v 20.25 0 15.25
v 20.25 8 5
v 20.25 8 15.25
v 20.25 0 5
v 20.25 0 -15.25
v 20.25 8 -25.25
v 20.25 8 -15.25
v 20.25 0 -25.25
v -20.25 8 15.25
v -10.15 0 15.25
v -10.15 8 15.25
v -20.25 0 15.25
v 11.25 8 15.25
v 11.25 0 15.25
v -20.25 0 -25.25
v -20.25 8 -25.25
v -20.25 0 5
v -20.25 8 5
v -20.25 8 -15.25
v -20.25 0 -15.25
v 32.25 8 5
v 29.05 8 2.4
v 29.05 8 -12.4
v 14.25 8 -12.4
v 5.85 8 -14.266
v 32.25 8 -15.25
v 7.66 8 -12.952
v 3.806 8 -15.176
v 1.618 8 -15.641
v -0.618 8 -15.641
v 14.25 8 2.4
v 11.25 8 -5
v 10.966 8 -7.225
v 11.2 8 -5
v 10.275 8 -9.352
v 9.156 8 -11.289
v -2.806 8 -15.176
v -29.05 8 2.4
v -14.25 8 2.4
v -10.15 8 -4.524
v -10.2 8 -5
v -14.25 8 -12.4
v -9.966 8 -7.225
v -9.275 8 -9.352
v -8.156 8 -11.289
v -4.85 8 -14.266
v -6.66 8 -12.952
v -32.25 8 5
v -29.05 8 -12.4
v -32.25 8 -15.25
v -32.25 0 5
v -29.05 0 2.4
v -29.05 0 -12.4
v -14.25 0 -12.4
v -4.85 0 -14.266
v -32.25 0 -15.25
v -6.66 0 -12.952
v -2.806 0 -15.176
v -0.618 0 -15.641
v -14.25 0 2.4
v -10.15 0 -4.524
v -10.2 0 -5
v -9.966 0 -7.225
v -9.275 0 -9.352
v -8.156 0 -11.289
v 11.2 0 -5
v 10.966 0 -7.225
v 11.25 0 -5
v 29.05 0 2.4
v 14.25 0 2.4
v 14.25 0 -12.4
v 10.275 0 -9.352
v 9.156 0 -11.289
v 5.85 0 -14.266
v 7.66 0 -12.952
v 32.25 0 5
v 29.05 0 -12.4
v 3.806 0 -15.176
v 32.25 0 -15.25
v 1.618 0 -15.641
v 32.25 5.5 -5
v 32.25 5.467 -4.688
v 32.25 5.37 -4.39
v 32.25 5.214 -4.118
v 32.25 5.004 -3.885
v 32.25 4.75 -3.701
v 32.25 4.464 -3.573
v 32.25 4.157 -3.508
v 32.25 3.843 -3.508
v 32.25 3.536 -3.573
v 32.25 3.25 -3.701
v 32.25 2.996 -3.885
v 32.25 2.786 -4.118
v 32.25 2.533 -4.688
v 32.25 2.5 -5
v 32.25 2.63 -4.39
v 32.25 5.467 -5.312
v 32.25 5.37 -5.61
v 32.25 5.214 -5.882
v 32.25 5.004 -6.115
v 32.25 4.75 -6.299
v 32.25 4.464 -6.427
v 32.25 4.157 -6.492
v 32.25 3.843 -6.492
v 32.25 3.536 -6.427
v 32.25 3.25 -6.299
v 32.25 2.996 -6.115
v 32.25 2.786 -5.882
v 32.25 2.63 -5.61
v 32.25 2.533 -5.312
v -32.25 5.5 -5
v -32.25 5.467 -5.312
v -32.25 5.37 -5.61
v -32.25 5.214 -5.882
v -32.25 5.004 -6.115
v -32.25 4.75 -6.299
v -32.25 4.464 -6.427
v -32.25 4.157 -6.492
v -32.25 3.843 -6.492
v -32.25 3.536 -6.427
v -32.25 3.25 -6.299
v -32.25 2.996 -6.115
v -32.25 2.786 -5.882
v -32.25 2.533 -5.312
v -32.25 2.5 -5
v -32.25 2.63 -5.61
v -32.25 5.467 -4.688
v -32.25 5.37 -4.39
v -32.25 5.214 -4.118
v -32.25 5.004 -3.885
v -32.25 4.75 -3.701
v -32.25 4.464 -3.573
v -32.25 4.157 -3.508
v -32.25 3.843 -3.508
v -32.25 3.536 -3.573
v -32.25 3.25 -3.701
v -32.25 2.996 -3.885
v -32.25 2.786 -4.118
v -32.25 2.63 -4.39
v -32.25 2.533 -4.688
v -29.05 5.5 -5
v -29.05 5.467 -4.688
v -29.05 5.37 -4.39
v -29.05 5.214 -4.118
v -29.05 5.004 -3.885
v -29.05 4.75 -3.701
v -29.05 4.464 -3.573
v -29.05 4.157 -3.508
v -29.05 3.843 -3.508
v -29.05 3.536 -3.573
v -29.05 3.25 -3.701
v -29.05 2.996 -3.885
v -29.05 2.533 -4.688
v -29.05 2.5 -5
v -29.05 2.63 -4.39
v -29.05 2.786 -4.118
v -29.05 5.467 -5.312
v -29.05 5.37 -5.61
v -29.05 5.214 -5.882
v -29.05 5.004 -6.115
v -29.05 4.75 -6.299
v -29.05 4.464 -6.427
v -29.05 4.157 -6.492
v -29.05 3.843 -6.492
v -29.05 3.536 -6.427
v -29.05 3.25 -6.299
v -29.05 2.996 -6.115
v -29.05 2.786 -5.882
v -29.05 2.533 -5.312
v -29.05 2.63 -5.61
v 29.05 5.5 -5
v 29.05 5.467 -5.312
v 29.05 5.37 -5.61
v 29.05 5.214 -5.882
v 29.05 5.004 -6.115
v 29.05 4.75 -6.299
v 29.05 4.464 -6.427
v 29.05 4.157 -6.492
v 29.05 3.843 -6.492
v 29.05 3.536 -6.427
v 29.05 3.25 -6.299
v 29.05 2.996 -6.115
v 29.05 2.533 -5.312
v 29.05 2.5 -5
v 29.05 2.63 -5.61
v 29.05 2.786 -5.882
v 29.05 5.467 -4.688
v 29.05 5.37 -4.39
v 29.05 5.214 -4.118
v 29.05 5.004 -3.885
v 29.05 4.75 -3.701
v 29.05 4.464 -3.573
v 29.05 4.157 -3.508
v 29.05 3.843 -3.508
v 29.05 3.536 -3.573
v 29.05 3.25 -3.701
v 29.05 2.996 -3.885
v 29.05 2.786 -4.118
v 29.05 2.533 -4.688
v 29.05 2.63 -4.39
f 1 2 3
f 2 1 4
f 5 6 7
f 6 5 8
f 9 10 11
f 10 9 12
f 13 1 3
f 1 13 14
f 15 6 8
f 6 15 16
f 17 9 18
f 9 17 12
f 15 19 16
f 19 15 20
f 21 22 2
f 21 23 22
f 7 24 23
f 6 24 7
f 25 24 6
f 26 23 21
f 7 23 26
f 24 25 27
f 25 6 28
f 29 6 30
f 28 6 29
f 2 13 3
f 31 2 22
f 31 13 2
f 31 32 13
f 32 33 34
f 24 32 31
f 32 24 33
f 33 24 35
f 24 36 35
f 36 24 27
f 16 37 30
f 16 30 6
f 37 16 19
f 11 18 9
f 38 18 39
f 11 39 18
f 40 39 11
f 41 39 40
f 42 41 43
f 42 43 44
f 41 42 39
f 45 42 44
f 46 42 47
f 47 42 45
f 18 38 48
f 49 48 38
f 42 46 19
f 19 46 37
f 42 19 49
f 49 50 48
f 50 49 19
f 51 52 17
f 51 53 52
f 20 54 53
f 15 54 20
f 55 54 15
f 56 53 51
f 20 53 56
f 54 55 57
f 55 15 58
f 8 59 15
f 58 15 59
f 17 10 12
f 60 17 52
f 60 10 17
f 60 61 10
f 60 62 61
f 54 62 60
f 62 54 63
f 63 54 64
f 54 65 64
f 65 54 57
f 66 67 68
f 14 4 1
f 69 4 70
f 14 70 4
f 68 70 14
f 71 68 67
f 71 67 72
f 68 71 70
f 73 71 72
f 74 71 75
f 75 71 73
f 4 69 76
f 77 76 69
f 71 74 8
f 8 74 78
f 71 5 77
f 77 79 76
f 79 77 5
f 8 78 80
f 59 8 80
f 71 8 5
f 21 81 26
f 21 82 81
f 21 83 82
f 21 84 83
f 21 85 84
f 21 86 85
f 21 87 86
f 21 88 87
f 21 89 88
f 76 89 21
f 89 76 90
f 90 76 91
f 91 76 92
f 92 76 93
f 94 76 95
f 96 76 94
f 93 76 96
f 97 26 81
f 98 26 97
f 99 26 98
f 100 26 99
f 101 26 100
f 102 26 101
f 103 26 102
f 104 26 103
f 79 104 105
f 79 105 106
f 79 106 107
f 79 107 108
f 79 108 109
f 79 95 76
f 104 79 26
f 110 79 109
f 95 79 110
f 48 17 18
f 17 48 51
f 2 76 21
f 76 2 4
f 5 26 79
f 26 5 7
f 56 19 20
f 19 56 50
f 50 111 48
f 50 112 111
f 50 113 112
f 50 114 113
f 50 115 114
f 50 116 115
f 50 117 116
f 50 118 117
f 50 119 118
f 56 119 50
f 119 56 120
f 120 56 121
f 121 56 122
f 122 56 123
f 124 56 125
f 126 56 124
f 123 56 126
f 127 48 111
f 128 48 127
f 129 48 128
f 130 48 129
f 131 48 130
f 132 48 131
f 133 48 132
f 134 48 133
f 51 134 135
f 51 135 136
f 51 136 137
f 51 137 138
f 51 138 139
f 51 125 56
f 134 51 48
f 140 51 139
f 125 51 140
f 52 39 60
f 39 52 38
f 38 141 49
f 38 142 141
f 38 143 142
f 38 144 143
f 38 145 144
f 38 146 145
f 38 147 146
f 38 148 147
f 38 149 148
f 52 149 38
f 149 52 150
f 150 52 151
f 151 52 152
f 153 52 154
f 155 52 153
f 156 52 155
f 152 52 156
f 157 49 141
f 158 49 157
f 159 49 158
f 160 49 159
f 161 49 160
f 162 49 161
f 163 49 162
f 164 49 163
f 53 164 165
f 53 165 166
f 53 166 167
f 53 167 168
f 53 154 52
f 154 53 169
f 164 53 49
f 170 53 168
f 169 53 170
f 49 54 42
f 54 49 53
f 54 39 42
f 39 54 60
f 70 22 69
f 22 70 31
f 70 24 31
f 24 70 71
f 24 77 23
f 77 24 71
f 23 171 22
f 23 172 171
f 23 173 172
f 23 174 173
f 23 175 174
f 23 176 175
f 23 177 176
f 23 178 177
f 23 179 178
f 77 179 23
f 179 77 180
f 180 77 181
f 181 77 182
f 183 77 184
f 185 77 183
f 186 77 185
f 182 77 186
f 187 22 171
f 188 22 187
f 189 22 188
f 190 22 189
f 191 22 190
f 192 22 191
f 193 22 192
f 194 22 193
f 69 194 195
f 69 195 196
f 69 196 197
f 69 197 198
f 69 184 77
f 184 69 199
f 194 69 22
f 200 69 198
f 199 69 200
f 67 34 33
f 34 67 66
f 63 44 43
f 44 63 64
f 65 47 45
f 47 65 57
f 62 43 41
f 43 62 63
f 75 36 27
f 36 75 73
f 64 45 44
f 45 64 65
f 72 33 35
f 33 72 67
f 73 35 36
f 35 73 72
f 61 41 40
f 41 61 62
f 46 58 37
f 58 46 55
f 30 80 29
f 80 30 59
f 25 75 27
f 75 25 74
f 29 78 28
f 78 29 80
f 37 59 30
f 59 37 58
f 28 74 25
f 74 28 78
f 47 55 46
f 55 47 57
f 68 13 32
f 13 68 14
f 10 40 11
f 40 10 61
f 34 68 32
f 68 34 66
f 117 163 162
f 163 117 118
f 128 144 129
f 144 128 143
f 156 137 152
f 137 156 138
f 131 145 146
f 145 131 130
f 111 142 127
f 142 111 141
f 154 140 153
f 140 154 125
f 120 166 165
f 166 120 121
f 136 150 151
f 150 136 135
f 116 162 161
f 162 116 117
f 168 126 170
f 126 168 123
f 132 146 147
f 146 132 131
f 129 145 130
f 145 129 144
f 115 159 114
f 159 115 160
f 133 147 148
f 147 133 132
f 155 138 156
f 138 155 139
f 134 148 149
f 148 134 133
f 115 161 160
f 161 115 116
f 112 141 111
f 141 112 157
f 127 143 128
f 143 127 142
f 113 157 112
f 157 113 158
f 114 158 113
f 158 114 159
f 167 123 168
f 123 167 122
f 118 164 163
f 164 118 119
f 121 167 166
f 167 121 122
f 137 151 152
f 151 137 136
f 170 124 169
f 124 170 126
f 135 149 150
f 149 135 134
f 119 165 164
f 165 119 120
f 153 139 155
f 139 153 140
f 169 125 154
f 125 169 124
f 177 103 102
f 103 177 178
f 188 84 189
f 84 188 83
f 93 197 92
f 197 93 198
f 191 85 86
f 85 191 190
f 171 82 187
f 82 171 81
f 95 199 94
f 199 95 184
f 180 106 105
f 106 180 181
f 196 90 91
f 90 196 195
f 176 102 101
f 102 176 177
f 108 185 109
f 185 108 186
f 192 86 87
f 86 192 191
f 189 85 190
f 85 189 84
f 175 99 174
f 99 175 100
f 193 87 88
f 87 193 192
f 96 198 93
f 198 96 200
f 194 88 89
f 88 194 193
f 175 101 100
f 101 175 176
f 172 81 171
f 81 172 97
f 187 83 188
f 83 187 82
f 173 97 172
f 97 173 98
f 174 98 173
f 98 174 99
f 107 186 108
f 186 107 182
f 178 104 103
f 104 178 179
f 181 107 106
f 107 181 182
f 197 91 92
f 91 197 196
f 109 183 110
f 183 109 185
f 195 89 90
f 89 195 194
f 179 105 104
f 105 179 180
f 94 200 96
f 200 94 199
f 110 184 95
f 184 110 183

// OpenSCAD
$fs=0.01;

barrelDiameter = 21.4;

extrusionThickness=14.8;

screwRadius = 1.5;
motorWidth = 28.5; // NEMA 11

wallThickness = 5;
partThickness = 8;

frameWidth = motorWidth + (wallThickness + 1)*2;

barrel_mount();

module fake_extrusion(){
    
    translate([wallThickness+1,-50,-(extrusionThickness/2 +wallThickness)])  //voodoo
    {
		rotate([0,0,90]){
			cube([100,extrusionThickness,extrusionThickness]);
		}
    }
    
    translate([wallThickness+motorWidth+extrusionThickness+1,-55,-(extrusionThickness/2 + wallThickness)])
    {
		rotate([0,0,90]){
			cube([100,extrusionThickness,extrusionThickness]);
		}
    }
}

module barrel_mount()
{
	//center the whole thing in X
	translate([-frameWidth/2, 0, 0])
	{
		difference()
		{
			//positive
			union()
			{
				translate([0,0,-(frameWidth+10)/2]){
				cube([frameWidth, partThickness, frameWidth]);
					translate([-12,0,10]){
				cube([frameWidth+24, partThickness, frameWidth/2]);    
					}
			}
		}


		//negative
		fake_extrusion();
		rotate([90, 0, 0])
		// todo remove that rotation
			{
				translate([frameWidth/2+0.5,  -5, -wallThickness])
				{
					translate([0, 0, -10])  //wtf? double voodoo
					cylinder(r=barrelDiameter/2, h=4*wallThickness+1);

				}
				translate([(barrelDiameter/2)-0.6,-5,-10]){
				cube([barrelDiameter,barrelDiameter,barrelDiameter]);
			}
			
		  translate([-frameWidth, -wallThickness, -partThickness/2]){
				rotate([0,90,0]){
					#cylinder(r=screwRadius,h=frameWidth);
				}
			}
		 translate([frameWidth, -wallThickness, -partThickness/2]){
				rotate([0,90,0]){
					#cylinder(r=screwRadius,h=frameWidth);
				}
			}
			
			}
		}
	}
}
